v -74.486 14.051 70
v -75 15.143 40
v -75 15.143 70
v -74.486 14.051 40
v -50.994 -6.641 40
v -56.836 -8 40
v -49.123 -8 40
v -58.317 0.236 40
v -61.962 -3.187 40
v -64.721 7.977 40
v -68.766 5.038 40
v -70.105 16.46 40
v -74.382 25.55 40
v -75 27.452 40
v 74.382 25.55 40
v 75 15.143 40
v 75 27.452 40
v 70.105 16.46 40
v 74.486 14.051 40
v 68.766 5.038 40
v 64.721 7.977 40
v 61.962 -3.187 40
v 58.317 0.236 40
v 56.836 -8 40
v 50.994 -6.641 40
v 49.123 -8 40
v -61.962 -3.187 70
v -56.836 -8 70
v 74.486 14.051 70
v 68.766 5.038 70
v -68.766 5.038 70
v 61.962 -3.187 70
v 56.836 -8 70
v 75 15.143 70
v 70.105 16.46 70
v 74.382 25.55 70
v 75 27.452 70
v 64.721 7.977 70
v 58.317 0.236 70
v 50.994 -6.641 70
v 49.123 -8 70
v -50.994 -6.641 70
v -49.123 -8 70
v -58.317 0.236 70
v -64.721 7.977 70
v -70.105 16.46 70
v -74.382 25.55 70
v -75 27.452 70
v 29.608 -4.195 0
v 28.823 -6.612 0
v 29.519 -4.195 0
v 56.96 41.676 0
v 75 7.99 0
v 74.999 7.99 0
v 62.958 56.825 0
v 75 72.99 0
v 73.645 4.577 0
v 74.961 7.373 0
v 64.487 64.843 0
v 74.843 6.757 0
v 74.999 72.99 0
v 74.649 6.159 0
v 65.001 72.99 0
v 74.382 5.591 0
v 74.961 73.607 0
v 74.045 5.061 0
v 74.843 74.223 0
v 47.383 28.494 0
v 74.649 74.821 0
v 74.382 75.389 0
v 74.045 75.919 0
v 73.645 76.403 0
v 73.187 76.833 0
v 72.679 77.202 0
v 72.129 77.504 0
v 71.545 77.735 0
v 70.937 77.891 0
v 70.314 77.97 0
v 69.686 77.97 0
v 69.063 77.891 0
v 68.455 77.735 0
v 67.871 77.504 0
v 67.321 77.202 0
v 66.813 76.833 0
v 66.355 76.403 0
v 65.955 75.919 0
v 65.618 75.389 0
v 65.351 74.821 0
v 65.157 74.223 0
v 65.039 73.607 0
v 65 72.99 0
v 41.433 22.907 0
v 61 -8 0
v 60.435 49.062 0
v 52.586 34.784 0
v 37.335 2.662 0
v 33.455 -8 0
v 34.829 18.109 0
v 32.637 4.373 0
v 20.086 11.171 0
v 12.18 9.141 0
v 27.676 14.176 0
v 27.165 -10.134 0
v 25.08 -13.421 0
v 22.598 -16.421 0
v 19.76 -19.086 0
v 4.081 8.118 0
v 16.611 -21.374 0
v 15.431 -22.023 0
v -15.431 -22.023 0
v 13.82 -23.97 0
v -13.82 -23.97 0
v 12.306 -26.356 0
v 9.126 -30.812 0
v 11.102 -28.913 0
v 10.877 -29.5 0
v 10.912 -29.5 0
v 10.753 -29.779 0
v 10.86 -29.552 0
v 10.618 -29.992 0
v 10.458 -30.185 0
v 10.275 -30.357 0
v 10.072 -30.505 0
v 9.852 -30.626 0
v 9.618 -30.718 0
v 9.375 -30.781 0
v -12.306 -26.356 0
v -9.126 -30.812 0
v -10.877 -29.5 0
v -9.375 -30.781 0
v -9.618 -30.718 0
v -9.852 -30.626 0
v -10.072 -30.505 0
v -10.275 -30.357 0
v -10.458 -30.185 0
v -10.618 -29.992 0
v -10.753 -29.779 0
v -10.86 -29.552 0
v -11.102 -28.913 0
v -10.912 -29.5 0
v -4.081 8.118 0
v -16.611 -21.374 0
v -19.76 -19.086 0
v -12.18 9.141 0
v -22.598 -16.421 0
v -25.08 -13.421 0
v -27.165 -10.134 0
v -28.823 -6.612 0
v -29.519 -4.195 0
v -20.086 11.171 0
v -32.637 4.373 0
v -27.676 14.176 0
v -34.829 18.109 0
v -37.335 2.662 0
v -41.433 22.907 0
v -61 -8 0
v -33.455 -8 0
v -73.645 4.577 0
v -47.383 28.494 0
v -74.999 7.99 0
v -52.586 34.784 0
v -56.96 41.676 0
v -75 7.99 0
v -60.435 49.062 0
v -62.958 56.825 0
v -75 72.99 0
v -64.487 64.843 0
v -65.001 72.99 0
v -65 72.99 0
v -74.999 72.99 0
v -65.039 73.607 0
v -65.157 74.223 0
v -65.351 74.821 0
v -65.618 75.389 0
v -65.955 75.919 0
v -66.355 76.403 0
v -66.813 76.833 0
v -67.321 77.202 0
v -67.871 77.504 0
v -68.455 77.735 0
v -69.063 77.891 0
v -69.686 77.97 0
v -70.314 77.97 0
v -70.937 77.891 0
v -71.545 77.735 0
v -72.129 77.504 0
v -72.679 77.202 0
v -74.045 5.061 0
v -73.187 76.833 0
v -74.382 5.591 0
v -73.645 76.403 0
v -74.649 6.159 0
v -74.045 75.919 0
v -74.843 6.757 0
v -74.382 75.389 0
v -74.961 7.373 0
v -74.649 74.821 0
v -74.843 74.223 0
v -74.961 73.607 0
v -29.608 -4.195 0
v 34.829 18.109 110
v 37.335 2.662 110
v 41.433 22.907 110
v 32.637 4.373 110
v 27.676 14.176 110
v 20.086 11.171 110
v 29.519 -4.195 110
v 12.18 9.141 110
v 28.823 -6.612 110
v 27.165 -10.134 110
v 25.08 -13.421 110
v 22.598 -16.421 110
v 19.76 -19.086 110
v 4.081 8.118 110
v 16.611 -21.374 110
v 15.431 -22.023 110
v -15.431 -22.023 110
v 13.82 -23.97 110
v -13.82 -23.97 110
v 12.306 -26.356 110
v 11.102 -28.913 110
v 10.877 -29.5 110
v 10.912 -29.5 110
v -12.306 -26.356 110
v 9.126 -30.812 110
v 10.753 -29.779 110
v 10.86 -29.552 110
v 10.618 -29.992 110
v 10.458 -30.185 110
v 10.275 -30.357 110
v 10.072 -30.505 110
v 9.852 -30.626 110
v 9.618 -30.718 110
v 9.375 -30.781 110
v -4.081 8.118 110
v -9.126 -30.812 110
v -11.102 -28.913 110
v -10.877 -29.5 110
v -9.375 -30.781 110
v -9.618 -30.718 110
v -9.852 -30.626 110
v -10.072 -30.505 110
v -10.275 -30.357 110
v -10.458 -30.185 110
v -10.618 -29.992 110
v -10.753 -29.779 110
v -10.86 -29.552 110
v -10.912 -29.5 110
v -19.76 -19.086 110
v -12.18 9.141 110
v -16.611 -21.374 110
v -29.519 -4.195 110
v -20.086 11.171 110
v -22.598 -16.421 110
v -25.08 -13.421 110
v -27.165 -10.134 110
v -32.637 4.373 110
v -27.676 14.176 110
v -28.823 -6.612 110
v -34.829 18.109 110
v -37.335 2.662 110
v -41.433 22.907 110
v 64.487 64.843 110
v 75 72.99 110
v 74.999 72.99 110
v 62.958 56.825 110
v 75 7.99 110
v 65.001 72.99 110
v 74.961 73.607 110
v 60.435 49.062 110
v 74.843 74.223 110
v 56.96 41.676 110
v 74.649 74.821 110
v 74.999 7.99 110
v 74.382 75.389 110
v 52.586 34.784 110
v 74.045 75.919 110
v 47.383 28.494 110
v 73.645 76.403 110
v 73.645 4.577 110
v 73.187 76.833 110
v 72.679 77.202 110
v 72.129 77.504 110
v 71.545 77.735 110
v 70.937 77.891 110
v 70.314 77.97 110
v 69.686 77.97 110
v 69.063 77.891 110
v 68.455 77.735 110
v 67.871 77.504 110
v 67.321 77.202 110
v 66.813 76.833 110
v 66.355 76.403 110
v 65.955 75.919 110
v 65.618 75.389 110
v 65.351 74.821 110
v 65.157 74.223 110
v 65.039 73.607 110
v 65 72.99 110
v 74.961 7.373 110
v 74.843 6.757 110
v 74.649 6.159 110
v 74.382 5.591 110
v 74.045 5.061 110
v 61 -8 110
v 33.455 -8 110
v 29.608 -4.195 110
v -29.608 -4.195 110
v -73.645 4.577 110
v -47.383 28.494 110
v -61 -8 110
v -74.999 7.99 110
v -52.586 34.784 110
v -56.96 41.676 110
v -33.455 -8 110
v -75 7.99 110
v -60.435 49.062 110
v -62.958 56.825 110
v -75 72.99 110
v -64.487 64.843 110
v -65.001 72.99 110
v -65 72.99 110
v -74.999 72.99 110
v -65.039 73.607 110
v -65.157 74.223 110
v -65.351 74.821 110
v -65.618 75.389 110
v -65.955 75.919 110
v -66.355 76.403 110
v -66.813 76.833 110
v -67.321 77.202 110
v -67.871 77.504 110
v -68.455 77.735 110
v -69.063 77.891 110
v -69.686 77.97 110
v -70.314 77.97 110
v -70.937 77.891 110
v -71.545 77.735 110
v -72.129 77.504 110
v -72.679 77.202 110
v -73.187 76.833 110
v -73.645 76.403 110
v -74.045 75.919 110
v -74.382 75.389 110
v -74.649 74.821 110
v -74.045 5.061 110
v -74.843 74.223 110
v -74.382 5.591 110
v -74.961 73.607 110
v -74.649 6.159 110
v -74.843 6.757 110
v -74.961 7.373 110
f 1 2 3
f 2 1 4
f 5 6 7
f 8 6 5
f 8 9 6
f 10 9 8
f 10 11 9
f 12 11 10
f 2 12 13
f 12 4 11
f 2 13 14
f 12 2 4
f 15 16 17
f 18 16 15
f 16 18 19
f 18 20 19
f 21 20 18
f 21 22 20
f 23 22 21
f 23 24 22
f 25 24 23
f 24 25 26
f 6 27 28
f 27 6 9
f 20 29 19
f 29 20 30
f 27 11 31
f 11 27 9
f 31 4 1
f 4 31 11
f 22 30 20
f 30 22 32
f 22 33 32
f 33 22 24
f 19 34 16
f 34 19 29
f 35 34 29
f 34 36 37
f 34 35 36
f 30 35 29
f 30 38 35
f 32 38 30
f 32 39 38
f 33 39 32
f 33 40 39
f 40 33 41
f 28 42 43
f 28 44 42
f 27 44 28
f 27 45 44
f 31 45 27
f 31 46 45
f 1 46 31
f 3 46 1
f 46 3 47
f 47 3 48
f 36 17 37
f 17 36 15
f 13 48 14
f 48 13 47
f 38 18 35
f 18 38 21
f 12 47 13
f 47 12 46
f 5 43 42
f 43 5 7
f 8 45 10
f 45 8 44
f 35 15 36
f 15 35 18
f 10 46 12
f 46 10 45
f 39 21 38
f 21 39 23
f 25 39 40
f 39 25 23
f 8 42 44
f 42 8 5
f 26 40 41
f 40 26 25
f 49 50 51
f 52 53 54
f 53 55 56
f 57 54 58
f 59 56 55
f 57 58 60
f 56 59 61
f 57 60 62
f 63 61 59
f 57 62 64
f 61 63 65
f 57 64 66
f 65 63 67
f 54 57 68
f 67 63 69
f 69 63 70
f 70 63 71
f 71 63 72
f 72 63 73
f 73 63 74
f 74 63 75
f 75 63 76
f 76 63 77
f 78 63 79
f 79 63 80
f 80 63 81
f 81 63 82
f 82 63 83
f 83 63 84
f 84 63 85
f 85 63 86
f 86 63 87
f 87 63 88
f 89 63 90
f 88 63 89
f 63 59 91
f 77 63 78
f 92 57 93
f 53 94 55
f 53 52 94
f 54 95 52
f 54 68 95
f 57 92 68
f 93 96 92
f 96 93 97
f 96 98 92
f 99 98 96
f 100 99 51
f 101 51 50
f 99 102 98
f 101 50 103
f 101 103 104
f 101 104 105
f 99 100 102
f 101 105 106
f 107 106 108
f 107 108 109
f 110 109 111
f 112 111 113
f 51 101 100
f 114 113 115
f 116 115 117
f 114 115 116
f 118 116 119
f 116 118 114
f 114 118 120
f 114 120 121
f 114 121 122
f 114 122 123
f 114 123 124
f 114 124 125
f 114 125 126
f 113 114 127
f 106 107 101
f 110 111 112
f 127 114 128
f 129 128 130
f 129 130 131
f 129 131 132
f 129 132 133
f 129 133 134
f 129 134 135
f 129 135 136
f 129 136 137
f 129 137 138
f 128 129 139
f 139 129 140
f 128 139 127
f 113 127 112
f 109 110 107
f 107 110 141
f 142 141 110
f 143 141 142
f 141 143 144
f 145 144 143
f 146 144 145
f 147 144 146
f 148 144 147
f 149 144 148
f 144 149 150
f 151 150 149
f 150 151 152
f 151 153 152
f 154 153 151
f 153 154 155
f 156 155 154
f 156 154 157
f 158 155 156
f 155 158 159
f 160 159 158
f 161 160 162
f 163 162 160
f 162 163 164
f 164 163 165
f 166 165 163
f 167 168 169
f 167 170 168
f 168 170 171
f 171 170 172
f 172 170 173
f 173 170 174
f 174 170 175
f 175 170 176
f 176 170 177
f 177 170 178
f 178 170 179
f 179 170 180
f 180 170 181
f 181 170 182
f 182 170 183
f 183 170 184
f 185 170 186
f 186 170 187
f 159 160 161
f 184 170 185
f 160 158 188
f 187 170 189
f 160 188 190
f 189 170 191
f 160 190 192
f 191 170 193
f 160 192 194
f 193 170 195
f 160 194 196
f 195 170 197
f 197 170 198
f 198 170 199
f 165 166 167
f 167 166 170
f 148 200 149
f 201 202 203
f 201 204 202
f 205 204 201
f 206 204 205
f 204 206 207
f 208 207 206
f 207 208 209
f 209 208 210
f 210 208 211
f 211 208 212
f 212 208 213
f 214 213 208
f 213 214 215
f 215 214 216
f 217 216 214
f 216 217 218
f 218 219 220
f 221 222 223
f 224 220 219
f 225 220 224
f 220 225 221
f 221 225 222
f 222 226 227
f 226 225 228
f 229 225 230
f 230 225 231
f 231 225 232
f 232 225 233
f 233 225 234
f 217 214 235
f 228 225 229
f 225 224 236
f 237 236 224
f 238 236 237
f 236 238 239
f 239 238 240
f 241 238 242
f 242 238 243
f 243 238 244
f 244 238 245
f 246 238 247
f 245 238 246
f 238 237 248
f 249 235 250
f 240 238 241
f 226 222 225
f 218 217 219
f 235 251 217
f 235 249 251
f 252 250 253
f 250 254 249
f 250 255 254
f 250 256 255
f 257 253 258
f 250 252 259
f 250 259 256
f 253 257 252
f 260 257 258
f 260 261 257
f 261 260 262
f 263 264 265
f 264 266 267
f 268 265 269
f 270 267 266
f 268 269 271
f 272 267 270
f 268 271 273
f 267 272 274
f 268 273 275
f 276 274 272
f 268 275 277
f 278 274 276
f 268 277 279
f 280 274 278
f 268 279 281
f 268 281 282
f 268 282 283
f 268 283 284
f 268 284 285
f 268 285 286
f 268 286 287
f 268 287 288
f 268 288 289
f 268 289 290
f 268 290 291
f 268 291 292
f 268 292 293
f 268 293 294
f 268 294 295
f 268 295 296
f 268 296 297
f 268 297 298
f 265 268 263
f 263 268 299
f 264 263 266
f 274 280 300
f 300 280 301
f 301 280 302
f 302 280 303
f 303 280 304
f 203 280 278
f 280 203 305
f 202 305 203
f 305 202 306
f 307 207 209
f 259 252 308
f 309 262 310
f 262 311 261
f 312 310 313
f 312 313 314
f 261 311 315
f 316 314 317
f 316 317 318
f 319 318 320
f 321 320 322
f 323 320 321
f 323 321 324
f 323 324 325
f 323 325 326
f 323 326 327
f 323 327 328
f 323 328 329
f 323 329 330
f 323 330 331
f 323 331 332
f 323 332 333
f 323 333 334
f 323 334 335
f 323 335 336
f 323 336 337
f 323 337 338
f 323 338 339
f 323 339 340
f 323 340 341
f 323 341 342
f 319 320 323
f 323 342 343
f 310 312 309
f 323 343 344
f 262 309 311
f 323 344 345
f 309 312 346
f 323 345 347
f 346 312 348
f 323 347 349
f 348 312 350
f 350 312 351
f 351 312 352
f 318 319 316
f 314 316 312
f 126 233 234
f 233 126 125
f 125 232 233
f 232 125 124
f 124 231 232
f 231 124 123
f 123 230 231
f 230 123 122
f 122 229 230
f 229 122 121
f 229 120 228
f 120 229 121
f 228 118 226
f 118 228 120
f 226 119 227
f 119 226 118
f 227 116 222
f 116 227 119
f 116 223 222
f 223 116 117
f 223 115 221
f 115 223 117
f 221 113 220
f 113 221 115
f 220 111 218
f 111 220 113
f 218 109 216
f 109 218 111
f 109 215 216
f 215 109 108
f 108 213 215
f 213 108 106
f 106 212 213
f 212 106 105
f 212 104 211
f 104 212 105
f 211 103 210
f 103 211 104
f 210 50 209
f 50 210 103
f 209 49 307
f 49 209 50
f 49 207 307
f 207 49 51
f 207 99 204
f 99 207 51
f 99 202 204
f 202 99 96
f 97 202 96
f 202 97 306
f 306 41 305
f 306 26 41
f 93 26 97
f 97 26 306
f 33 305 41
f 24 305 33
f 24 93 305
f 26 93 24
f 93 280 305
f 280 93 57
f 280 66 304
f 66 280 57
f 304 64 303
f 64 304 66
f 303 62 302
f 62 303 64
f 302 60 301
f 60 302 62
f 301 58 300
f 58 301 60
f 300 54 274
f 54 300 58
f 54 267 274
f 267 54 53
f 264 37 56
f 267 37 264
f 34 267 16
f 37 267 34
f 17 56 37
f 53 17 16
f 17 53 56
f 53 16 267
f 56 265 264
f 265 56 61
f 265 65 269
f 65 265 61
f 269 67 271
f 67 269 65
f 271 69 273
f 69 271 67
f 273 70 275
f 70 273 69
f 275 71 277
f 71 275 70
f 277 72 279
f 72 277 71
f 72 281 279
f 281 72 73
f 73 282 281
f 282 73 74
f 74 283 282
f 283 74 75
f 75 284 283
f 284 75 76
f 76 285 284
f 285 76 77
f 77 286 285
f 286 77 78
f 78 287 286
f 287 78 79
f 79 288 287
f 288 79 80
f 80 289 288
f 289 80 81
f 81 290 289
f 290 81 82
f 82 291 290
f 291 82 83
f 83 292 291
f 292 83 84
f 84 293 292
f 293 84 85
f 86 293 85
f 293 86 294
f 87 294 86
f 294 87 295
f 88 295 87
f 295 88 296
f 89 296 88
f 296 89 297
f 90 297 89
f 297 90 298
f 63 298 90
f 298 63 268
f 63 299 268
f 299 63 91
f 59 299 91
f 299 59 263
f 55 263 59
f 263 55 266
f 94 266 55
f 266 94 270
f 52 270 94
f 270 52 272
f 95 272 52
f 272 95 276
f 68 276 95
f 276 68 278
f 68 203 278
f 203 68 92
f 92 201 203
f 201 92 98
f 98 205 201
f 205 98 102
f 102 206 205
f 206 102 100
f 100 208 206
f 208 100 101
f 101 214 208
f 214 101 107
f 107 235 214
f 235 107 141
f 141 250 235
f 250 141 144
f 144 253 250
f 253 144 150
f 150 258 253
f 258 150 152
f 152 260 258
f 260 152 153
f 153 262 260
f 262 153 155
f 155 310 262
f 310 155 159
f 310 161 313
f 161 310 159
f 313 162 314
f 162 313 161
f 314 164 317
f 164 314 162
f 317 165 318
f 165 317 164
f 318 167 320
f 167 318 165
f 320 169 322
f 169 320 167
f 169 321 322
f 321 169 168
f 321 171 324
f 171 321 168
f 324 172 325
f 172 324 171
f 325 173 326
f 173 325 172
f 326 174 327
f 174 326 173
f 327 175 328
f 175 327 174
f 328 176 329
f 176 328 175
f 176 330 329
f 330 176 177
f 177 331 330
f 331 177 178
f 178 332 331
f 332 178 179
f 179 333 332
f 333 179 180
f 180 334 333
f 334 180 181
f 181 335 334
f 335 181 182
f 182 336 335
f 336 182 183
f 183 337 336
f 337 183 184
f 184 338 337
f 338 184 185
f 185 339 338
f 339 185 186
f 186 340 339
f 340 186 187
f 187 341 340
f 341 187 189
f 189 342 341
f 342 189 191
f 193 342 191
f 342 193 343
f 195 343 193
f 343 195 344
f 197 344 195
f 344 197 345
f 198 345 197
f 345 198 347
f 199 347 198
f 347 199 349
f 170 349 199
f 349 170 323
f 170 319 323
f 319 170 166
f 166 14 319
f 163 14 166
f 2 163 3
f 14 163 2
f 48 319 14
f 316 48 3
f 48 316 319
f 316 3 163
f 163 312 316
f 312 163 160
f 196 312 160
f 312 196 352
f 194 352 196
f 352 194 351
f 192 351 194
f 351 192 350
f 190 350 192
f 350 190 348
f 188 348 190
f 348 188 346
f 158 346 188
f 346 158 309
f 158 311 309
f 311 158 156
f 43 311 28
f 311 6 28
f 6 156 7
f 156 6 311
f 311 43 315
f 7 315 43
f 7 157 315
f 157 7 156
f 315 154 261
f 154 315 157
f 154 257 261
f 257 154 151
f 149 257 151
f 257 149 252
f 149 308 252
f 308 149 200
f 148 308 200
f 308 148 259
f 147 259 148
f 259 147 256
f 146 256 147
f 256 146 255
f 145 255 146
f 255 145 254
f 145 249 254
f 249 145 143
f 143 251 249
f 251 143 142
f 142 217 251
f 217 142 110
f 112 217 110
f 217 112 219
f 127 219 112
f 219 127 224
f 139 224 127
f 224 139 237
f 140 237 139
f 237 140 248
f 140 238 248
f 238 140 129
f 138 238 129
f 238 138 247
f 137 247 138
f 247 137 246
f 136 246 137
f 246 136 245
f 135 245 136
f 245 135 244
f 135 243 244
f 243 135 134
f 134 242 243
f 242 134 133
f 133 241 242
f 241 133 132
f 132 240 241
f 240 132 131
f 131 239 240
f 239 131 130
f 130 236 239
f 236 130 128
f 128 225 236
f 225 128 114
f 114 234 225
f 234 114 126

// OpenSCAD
// Thule Fat Bike Tray Adapter

 * color([1,0,0])
    translate([0,5,-5.5])  // offset for top/bottom compare
        import("fat_bike_tray_adapter_shape_test_print_02.stl");

testPrint=false;

overallLength= (testPrint) ? 5 : 110;

roundnessRadius=5;

tireDia=130;

topEdgeThickness=10;

fatTrayFullWidth=tireDia+topEdgeThickness*2;

trayInnerWidth=62;

thuleTraySideConcavityDia=100;

trayBottomWidth=22;
trayBottomCornerDia=4;
// exit angle of 90 would be vertical.  less than 90
// means the part needs to be sliced at the top and
// the next curve should be sliced off at the bottom
// to match the curve.
trayBottomCornerExitAngle=70;
trayBottomCornerTrimHeight=cos(trayBottomCornerExitAngle)
    *(trayBottomCornerDia/2);

// "tighness" of the convex curve
trayBottomConvexCurveDia=45;
// vertical size of the horizontal slice across the part where there
// is a convex curve in the tray wall, just above the channel
trayBottomConvexCurveHeight=7.5;

curveMatchOffset=4.2;

overhangThickness=16;
overhangDepth=8;
overhangWidth=30;
overhangFlairAngle=20;
// how much to push out the rotated notches so they mesh
// smoothly with the top edges of the "bowl"
overhangFlairAdjust=1.25;

overhangEdgeCurveDia=10;

// How much to cut off the top of the "bowl" part
// of the tray shape at the top (and move it up)
// to match blend smoothly with the flair angle
// This could probably be calculated with sin/cos
// based on the angle and the diameter of the bowl
// (which is currently / wrongly "trayInnerWidth")
topEdgeCurveMatchOffset=9;

trayEdgeThickness=5;

slotCutOuterDia=170;
slotCutWidth=30;
slotCutThickness=5;
slotCutPositionAdjustY=-30;


$fn=50;
overlap=0.01;

difference() {
    linear_extrude(height=overallLength) {
        completeShapeOutline();
    }
    translate([0,slotCutOuterDia/2+slotCutPositionAdjustY,
            overallLength/2-slotCutWidth/2])
        slotCut();
}

// half circle band through the lower corners of the
// fat-tire cradle / top part
module slotCut() {
    difference() {
        cylinder(d=slotCutOuterDia, h=slotCutWidth);
        translate([0,0,-overlap])
            cylinder(d=slotCutOuterDia-slotCutThickness*2, 
                h=slotCutWidth+overlap*2);
        // cut off the top
        translate([-slotCutOuterDia/2-overlap,0,-overlap])
            cube([slotCutOuterDia+overlap*2,
                slotCutOuterDia, slotCutWidth+overlap*2]);
        // cut out the middle
        translate([-trayInnerWidth/2-overlap,
                -slotCutOuterDia+trayInnerWidth,-overlap])
            cube([trayInnerWidth+overlap*2,
                trayInnerWidth, slotCutWidth+overlap*2]);
    }
}

module completeShapeOutline() {
    union() {
        translate([0,-trayInnerWidth/2
                -trayBottomConvexCurveHeight
                +topEdgeCurveMatchOffset])
            bottomShape();   
//        color([0,1,0])
            overhang();
        translate([0,overhangThickness/2-overlap])
            topShape(); 
    }
}

module topShape() {
    translate([0,tireDia/4])  // return it sitting on the x-axis
        union() {
            difference() {
                square([tireDia+2*topEdgeThickness,
                        tireDia/2], center=true);
                translate([0,tireDia/4])
                    circle(d=tireDia);
            }
            translate([tireDia/2+topEdgeThickness/2,tireDia/4-overlap])
                circle(d=topEdgeThickness);
            translate([-tireDia/2-topEdgeThickness/2,tireDia/4-overlap])
                circle(d=topEdgeThickness);
        }
}

module overhang() {
    difference() {
        hull() {
            square([overhangWidth*2+trayInnerWidth,overhangThickness], 
                    center=true);
            // end-pieces (transition for the overhang block)
            // Note: Full circle would add height or wouldn't be
            // tangent to the vertical edge.
            translate([fatTrayFullWidth/2-overhangEdgeCurveDia/2,
                    overhangThickness/2,0])
                lowerHalfCircle(overhangEdgeCurveDia);
            translate([-fatTrayFullWidth/2+overhangEdgeCurveDia/2,
                    overhangThickness/2,0])
                lowerHalfCircle(overhangEdgeCurveDia);
        
        }
        translate([trayInnerWidth/2+overhangFlairAdjust,
                -overhangThickness/2+overhangDepth/2])
            rotate([0,0,-overhangFlairAngle])
                square([trayEdgeThickness,overhangDepth*2], 
                    center=true);
        translate([-trayInnerWidth/2-overhangFlairAdjust,
                -overhangThickness/2+overhangDepth/2])
            rotate([0,0,overhangFlairAngle])
            square([trayEdgeThickness,overhangDepth*2], center=true);
    }
}

module bottomShape() {
    translate([0,0,0])
        centerBottomChannelShape();
    // "bowl" shape to match the concave inside of the tray
    // 1) Move up-y to sit on top of the centerBottomChannelShape
    // 2) Move back down so the curves with the curves mesh
    //    (note: This must include the amount cut off the bowl-top)
    translate([0,trayInnerWidth/2+trayBottomConvexCurveHeight
            -curveMatchOffset-topEdgeCurveMatchOffset])
        difference() {
            translate([0,topEdgeCurveMatchOffset,0])
                circle(d=trayInnerWidth);
            translate([0,trayInnerWidth/2+overlap])
                square([trayInnerWidth+overlap*2,
                        trayInnerWidth+overlap],
                        center=true);
        }
}

module centerBottomChannelShape() {
    centerBottomChannel();
    centerBottomTransition();
} 

module centerBottomChannel() {
    // center/bottom part
    hull() {
        translate([trayBottomWidth/2-trayBottomCornerDia/2,0])
            slicedCircle(trayBottomCornerDia,trayBottomCornerExitAngle);
        translate([-trayBottomWidth/2+trayBottomCornerDia/2,0])
            slicedCircle(trayBottomCornerDia,trayBottomCornerExitAngle);
*        translate([0,trayBottomCornerDia])
            polygon(points = [
                [-trayBottomWidth/2,0],
                [trayBottomWidth/2,0],
                [trayBottomWidth/2,trayBottomCornerDia],
                [-trayBottomWidth/2,trayBottomCornerDia]], center=true);
        // square([trayBottomWidth,trayBottomCornerDia],center=true);
    }
}

module centerBottomTransition() {
    // convex transition curve from bottom to concave side 
    difference() {
        translate([0,trayBottomConvexCurveHeight/2])
            square([trayBottomWidth+trayBottomConvexCurveDia,
                trayBottomConvexCurveHeight], center=true);
        // the circle cut doesn't start at the 90 / side of the circle
        // so it needs to be inset a bit to mesh.  This calculates
        // where that mesh point should be.
        meshPointOffset = (trayBottomConvexCurveDia/2 -
            sin(trayBottomCornerExitAngle)*trayBottomConvexCurveDia/2)
            + (trayBottomCornerDia/2 - 
            sin(trayBottomCornerExitAngle)*trayBottomCornerDia/2);
        translate([trayBottomWidth/2+trayBottomConvexCurveDia/2
                -meshPointOffset,0])
            rotate([0,0,180])
            slicedCircle(trayBottomConvexCurveDia,trayBottomCornerExitAngle);
        translate([-trayBottomWidth/2-trayBottomConvexCurveDia/2
                +meshPointOffset,0])
            rotate([0,0,180])
            slicedCircle(trayBottomConvexCurveDia,trayBottomCornerExitAngle);
    }
}

// sliceAngle is the tangent angle where the circle will be cut off
// parallel to the x-axis
module slicedCircle(circleDia, sliceAngle) {
    offset = cos(sliceAngle)*circleDia/2;
    difference() {
        translate([0,offset])
            circle(d=circleDia);
        translate([0,circleDia/2+overlap])
            square([circleDia+overlap*2,circleDia+overlap*2], center=true);
        
    }
}

module lowerHalfCircle(lowerHalfCircleDia) {
    difference() {
        circle(d=lowerHalfCircleDia);
        translate([0,lowerHalfCircleDia/2])
            square([lowerHalfCircleDia+overlap*2,lowerHalfCircleDia], 
                center=true);
    }
}
